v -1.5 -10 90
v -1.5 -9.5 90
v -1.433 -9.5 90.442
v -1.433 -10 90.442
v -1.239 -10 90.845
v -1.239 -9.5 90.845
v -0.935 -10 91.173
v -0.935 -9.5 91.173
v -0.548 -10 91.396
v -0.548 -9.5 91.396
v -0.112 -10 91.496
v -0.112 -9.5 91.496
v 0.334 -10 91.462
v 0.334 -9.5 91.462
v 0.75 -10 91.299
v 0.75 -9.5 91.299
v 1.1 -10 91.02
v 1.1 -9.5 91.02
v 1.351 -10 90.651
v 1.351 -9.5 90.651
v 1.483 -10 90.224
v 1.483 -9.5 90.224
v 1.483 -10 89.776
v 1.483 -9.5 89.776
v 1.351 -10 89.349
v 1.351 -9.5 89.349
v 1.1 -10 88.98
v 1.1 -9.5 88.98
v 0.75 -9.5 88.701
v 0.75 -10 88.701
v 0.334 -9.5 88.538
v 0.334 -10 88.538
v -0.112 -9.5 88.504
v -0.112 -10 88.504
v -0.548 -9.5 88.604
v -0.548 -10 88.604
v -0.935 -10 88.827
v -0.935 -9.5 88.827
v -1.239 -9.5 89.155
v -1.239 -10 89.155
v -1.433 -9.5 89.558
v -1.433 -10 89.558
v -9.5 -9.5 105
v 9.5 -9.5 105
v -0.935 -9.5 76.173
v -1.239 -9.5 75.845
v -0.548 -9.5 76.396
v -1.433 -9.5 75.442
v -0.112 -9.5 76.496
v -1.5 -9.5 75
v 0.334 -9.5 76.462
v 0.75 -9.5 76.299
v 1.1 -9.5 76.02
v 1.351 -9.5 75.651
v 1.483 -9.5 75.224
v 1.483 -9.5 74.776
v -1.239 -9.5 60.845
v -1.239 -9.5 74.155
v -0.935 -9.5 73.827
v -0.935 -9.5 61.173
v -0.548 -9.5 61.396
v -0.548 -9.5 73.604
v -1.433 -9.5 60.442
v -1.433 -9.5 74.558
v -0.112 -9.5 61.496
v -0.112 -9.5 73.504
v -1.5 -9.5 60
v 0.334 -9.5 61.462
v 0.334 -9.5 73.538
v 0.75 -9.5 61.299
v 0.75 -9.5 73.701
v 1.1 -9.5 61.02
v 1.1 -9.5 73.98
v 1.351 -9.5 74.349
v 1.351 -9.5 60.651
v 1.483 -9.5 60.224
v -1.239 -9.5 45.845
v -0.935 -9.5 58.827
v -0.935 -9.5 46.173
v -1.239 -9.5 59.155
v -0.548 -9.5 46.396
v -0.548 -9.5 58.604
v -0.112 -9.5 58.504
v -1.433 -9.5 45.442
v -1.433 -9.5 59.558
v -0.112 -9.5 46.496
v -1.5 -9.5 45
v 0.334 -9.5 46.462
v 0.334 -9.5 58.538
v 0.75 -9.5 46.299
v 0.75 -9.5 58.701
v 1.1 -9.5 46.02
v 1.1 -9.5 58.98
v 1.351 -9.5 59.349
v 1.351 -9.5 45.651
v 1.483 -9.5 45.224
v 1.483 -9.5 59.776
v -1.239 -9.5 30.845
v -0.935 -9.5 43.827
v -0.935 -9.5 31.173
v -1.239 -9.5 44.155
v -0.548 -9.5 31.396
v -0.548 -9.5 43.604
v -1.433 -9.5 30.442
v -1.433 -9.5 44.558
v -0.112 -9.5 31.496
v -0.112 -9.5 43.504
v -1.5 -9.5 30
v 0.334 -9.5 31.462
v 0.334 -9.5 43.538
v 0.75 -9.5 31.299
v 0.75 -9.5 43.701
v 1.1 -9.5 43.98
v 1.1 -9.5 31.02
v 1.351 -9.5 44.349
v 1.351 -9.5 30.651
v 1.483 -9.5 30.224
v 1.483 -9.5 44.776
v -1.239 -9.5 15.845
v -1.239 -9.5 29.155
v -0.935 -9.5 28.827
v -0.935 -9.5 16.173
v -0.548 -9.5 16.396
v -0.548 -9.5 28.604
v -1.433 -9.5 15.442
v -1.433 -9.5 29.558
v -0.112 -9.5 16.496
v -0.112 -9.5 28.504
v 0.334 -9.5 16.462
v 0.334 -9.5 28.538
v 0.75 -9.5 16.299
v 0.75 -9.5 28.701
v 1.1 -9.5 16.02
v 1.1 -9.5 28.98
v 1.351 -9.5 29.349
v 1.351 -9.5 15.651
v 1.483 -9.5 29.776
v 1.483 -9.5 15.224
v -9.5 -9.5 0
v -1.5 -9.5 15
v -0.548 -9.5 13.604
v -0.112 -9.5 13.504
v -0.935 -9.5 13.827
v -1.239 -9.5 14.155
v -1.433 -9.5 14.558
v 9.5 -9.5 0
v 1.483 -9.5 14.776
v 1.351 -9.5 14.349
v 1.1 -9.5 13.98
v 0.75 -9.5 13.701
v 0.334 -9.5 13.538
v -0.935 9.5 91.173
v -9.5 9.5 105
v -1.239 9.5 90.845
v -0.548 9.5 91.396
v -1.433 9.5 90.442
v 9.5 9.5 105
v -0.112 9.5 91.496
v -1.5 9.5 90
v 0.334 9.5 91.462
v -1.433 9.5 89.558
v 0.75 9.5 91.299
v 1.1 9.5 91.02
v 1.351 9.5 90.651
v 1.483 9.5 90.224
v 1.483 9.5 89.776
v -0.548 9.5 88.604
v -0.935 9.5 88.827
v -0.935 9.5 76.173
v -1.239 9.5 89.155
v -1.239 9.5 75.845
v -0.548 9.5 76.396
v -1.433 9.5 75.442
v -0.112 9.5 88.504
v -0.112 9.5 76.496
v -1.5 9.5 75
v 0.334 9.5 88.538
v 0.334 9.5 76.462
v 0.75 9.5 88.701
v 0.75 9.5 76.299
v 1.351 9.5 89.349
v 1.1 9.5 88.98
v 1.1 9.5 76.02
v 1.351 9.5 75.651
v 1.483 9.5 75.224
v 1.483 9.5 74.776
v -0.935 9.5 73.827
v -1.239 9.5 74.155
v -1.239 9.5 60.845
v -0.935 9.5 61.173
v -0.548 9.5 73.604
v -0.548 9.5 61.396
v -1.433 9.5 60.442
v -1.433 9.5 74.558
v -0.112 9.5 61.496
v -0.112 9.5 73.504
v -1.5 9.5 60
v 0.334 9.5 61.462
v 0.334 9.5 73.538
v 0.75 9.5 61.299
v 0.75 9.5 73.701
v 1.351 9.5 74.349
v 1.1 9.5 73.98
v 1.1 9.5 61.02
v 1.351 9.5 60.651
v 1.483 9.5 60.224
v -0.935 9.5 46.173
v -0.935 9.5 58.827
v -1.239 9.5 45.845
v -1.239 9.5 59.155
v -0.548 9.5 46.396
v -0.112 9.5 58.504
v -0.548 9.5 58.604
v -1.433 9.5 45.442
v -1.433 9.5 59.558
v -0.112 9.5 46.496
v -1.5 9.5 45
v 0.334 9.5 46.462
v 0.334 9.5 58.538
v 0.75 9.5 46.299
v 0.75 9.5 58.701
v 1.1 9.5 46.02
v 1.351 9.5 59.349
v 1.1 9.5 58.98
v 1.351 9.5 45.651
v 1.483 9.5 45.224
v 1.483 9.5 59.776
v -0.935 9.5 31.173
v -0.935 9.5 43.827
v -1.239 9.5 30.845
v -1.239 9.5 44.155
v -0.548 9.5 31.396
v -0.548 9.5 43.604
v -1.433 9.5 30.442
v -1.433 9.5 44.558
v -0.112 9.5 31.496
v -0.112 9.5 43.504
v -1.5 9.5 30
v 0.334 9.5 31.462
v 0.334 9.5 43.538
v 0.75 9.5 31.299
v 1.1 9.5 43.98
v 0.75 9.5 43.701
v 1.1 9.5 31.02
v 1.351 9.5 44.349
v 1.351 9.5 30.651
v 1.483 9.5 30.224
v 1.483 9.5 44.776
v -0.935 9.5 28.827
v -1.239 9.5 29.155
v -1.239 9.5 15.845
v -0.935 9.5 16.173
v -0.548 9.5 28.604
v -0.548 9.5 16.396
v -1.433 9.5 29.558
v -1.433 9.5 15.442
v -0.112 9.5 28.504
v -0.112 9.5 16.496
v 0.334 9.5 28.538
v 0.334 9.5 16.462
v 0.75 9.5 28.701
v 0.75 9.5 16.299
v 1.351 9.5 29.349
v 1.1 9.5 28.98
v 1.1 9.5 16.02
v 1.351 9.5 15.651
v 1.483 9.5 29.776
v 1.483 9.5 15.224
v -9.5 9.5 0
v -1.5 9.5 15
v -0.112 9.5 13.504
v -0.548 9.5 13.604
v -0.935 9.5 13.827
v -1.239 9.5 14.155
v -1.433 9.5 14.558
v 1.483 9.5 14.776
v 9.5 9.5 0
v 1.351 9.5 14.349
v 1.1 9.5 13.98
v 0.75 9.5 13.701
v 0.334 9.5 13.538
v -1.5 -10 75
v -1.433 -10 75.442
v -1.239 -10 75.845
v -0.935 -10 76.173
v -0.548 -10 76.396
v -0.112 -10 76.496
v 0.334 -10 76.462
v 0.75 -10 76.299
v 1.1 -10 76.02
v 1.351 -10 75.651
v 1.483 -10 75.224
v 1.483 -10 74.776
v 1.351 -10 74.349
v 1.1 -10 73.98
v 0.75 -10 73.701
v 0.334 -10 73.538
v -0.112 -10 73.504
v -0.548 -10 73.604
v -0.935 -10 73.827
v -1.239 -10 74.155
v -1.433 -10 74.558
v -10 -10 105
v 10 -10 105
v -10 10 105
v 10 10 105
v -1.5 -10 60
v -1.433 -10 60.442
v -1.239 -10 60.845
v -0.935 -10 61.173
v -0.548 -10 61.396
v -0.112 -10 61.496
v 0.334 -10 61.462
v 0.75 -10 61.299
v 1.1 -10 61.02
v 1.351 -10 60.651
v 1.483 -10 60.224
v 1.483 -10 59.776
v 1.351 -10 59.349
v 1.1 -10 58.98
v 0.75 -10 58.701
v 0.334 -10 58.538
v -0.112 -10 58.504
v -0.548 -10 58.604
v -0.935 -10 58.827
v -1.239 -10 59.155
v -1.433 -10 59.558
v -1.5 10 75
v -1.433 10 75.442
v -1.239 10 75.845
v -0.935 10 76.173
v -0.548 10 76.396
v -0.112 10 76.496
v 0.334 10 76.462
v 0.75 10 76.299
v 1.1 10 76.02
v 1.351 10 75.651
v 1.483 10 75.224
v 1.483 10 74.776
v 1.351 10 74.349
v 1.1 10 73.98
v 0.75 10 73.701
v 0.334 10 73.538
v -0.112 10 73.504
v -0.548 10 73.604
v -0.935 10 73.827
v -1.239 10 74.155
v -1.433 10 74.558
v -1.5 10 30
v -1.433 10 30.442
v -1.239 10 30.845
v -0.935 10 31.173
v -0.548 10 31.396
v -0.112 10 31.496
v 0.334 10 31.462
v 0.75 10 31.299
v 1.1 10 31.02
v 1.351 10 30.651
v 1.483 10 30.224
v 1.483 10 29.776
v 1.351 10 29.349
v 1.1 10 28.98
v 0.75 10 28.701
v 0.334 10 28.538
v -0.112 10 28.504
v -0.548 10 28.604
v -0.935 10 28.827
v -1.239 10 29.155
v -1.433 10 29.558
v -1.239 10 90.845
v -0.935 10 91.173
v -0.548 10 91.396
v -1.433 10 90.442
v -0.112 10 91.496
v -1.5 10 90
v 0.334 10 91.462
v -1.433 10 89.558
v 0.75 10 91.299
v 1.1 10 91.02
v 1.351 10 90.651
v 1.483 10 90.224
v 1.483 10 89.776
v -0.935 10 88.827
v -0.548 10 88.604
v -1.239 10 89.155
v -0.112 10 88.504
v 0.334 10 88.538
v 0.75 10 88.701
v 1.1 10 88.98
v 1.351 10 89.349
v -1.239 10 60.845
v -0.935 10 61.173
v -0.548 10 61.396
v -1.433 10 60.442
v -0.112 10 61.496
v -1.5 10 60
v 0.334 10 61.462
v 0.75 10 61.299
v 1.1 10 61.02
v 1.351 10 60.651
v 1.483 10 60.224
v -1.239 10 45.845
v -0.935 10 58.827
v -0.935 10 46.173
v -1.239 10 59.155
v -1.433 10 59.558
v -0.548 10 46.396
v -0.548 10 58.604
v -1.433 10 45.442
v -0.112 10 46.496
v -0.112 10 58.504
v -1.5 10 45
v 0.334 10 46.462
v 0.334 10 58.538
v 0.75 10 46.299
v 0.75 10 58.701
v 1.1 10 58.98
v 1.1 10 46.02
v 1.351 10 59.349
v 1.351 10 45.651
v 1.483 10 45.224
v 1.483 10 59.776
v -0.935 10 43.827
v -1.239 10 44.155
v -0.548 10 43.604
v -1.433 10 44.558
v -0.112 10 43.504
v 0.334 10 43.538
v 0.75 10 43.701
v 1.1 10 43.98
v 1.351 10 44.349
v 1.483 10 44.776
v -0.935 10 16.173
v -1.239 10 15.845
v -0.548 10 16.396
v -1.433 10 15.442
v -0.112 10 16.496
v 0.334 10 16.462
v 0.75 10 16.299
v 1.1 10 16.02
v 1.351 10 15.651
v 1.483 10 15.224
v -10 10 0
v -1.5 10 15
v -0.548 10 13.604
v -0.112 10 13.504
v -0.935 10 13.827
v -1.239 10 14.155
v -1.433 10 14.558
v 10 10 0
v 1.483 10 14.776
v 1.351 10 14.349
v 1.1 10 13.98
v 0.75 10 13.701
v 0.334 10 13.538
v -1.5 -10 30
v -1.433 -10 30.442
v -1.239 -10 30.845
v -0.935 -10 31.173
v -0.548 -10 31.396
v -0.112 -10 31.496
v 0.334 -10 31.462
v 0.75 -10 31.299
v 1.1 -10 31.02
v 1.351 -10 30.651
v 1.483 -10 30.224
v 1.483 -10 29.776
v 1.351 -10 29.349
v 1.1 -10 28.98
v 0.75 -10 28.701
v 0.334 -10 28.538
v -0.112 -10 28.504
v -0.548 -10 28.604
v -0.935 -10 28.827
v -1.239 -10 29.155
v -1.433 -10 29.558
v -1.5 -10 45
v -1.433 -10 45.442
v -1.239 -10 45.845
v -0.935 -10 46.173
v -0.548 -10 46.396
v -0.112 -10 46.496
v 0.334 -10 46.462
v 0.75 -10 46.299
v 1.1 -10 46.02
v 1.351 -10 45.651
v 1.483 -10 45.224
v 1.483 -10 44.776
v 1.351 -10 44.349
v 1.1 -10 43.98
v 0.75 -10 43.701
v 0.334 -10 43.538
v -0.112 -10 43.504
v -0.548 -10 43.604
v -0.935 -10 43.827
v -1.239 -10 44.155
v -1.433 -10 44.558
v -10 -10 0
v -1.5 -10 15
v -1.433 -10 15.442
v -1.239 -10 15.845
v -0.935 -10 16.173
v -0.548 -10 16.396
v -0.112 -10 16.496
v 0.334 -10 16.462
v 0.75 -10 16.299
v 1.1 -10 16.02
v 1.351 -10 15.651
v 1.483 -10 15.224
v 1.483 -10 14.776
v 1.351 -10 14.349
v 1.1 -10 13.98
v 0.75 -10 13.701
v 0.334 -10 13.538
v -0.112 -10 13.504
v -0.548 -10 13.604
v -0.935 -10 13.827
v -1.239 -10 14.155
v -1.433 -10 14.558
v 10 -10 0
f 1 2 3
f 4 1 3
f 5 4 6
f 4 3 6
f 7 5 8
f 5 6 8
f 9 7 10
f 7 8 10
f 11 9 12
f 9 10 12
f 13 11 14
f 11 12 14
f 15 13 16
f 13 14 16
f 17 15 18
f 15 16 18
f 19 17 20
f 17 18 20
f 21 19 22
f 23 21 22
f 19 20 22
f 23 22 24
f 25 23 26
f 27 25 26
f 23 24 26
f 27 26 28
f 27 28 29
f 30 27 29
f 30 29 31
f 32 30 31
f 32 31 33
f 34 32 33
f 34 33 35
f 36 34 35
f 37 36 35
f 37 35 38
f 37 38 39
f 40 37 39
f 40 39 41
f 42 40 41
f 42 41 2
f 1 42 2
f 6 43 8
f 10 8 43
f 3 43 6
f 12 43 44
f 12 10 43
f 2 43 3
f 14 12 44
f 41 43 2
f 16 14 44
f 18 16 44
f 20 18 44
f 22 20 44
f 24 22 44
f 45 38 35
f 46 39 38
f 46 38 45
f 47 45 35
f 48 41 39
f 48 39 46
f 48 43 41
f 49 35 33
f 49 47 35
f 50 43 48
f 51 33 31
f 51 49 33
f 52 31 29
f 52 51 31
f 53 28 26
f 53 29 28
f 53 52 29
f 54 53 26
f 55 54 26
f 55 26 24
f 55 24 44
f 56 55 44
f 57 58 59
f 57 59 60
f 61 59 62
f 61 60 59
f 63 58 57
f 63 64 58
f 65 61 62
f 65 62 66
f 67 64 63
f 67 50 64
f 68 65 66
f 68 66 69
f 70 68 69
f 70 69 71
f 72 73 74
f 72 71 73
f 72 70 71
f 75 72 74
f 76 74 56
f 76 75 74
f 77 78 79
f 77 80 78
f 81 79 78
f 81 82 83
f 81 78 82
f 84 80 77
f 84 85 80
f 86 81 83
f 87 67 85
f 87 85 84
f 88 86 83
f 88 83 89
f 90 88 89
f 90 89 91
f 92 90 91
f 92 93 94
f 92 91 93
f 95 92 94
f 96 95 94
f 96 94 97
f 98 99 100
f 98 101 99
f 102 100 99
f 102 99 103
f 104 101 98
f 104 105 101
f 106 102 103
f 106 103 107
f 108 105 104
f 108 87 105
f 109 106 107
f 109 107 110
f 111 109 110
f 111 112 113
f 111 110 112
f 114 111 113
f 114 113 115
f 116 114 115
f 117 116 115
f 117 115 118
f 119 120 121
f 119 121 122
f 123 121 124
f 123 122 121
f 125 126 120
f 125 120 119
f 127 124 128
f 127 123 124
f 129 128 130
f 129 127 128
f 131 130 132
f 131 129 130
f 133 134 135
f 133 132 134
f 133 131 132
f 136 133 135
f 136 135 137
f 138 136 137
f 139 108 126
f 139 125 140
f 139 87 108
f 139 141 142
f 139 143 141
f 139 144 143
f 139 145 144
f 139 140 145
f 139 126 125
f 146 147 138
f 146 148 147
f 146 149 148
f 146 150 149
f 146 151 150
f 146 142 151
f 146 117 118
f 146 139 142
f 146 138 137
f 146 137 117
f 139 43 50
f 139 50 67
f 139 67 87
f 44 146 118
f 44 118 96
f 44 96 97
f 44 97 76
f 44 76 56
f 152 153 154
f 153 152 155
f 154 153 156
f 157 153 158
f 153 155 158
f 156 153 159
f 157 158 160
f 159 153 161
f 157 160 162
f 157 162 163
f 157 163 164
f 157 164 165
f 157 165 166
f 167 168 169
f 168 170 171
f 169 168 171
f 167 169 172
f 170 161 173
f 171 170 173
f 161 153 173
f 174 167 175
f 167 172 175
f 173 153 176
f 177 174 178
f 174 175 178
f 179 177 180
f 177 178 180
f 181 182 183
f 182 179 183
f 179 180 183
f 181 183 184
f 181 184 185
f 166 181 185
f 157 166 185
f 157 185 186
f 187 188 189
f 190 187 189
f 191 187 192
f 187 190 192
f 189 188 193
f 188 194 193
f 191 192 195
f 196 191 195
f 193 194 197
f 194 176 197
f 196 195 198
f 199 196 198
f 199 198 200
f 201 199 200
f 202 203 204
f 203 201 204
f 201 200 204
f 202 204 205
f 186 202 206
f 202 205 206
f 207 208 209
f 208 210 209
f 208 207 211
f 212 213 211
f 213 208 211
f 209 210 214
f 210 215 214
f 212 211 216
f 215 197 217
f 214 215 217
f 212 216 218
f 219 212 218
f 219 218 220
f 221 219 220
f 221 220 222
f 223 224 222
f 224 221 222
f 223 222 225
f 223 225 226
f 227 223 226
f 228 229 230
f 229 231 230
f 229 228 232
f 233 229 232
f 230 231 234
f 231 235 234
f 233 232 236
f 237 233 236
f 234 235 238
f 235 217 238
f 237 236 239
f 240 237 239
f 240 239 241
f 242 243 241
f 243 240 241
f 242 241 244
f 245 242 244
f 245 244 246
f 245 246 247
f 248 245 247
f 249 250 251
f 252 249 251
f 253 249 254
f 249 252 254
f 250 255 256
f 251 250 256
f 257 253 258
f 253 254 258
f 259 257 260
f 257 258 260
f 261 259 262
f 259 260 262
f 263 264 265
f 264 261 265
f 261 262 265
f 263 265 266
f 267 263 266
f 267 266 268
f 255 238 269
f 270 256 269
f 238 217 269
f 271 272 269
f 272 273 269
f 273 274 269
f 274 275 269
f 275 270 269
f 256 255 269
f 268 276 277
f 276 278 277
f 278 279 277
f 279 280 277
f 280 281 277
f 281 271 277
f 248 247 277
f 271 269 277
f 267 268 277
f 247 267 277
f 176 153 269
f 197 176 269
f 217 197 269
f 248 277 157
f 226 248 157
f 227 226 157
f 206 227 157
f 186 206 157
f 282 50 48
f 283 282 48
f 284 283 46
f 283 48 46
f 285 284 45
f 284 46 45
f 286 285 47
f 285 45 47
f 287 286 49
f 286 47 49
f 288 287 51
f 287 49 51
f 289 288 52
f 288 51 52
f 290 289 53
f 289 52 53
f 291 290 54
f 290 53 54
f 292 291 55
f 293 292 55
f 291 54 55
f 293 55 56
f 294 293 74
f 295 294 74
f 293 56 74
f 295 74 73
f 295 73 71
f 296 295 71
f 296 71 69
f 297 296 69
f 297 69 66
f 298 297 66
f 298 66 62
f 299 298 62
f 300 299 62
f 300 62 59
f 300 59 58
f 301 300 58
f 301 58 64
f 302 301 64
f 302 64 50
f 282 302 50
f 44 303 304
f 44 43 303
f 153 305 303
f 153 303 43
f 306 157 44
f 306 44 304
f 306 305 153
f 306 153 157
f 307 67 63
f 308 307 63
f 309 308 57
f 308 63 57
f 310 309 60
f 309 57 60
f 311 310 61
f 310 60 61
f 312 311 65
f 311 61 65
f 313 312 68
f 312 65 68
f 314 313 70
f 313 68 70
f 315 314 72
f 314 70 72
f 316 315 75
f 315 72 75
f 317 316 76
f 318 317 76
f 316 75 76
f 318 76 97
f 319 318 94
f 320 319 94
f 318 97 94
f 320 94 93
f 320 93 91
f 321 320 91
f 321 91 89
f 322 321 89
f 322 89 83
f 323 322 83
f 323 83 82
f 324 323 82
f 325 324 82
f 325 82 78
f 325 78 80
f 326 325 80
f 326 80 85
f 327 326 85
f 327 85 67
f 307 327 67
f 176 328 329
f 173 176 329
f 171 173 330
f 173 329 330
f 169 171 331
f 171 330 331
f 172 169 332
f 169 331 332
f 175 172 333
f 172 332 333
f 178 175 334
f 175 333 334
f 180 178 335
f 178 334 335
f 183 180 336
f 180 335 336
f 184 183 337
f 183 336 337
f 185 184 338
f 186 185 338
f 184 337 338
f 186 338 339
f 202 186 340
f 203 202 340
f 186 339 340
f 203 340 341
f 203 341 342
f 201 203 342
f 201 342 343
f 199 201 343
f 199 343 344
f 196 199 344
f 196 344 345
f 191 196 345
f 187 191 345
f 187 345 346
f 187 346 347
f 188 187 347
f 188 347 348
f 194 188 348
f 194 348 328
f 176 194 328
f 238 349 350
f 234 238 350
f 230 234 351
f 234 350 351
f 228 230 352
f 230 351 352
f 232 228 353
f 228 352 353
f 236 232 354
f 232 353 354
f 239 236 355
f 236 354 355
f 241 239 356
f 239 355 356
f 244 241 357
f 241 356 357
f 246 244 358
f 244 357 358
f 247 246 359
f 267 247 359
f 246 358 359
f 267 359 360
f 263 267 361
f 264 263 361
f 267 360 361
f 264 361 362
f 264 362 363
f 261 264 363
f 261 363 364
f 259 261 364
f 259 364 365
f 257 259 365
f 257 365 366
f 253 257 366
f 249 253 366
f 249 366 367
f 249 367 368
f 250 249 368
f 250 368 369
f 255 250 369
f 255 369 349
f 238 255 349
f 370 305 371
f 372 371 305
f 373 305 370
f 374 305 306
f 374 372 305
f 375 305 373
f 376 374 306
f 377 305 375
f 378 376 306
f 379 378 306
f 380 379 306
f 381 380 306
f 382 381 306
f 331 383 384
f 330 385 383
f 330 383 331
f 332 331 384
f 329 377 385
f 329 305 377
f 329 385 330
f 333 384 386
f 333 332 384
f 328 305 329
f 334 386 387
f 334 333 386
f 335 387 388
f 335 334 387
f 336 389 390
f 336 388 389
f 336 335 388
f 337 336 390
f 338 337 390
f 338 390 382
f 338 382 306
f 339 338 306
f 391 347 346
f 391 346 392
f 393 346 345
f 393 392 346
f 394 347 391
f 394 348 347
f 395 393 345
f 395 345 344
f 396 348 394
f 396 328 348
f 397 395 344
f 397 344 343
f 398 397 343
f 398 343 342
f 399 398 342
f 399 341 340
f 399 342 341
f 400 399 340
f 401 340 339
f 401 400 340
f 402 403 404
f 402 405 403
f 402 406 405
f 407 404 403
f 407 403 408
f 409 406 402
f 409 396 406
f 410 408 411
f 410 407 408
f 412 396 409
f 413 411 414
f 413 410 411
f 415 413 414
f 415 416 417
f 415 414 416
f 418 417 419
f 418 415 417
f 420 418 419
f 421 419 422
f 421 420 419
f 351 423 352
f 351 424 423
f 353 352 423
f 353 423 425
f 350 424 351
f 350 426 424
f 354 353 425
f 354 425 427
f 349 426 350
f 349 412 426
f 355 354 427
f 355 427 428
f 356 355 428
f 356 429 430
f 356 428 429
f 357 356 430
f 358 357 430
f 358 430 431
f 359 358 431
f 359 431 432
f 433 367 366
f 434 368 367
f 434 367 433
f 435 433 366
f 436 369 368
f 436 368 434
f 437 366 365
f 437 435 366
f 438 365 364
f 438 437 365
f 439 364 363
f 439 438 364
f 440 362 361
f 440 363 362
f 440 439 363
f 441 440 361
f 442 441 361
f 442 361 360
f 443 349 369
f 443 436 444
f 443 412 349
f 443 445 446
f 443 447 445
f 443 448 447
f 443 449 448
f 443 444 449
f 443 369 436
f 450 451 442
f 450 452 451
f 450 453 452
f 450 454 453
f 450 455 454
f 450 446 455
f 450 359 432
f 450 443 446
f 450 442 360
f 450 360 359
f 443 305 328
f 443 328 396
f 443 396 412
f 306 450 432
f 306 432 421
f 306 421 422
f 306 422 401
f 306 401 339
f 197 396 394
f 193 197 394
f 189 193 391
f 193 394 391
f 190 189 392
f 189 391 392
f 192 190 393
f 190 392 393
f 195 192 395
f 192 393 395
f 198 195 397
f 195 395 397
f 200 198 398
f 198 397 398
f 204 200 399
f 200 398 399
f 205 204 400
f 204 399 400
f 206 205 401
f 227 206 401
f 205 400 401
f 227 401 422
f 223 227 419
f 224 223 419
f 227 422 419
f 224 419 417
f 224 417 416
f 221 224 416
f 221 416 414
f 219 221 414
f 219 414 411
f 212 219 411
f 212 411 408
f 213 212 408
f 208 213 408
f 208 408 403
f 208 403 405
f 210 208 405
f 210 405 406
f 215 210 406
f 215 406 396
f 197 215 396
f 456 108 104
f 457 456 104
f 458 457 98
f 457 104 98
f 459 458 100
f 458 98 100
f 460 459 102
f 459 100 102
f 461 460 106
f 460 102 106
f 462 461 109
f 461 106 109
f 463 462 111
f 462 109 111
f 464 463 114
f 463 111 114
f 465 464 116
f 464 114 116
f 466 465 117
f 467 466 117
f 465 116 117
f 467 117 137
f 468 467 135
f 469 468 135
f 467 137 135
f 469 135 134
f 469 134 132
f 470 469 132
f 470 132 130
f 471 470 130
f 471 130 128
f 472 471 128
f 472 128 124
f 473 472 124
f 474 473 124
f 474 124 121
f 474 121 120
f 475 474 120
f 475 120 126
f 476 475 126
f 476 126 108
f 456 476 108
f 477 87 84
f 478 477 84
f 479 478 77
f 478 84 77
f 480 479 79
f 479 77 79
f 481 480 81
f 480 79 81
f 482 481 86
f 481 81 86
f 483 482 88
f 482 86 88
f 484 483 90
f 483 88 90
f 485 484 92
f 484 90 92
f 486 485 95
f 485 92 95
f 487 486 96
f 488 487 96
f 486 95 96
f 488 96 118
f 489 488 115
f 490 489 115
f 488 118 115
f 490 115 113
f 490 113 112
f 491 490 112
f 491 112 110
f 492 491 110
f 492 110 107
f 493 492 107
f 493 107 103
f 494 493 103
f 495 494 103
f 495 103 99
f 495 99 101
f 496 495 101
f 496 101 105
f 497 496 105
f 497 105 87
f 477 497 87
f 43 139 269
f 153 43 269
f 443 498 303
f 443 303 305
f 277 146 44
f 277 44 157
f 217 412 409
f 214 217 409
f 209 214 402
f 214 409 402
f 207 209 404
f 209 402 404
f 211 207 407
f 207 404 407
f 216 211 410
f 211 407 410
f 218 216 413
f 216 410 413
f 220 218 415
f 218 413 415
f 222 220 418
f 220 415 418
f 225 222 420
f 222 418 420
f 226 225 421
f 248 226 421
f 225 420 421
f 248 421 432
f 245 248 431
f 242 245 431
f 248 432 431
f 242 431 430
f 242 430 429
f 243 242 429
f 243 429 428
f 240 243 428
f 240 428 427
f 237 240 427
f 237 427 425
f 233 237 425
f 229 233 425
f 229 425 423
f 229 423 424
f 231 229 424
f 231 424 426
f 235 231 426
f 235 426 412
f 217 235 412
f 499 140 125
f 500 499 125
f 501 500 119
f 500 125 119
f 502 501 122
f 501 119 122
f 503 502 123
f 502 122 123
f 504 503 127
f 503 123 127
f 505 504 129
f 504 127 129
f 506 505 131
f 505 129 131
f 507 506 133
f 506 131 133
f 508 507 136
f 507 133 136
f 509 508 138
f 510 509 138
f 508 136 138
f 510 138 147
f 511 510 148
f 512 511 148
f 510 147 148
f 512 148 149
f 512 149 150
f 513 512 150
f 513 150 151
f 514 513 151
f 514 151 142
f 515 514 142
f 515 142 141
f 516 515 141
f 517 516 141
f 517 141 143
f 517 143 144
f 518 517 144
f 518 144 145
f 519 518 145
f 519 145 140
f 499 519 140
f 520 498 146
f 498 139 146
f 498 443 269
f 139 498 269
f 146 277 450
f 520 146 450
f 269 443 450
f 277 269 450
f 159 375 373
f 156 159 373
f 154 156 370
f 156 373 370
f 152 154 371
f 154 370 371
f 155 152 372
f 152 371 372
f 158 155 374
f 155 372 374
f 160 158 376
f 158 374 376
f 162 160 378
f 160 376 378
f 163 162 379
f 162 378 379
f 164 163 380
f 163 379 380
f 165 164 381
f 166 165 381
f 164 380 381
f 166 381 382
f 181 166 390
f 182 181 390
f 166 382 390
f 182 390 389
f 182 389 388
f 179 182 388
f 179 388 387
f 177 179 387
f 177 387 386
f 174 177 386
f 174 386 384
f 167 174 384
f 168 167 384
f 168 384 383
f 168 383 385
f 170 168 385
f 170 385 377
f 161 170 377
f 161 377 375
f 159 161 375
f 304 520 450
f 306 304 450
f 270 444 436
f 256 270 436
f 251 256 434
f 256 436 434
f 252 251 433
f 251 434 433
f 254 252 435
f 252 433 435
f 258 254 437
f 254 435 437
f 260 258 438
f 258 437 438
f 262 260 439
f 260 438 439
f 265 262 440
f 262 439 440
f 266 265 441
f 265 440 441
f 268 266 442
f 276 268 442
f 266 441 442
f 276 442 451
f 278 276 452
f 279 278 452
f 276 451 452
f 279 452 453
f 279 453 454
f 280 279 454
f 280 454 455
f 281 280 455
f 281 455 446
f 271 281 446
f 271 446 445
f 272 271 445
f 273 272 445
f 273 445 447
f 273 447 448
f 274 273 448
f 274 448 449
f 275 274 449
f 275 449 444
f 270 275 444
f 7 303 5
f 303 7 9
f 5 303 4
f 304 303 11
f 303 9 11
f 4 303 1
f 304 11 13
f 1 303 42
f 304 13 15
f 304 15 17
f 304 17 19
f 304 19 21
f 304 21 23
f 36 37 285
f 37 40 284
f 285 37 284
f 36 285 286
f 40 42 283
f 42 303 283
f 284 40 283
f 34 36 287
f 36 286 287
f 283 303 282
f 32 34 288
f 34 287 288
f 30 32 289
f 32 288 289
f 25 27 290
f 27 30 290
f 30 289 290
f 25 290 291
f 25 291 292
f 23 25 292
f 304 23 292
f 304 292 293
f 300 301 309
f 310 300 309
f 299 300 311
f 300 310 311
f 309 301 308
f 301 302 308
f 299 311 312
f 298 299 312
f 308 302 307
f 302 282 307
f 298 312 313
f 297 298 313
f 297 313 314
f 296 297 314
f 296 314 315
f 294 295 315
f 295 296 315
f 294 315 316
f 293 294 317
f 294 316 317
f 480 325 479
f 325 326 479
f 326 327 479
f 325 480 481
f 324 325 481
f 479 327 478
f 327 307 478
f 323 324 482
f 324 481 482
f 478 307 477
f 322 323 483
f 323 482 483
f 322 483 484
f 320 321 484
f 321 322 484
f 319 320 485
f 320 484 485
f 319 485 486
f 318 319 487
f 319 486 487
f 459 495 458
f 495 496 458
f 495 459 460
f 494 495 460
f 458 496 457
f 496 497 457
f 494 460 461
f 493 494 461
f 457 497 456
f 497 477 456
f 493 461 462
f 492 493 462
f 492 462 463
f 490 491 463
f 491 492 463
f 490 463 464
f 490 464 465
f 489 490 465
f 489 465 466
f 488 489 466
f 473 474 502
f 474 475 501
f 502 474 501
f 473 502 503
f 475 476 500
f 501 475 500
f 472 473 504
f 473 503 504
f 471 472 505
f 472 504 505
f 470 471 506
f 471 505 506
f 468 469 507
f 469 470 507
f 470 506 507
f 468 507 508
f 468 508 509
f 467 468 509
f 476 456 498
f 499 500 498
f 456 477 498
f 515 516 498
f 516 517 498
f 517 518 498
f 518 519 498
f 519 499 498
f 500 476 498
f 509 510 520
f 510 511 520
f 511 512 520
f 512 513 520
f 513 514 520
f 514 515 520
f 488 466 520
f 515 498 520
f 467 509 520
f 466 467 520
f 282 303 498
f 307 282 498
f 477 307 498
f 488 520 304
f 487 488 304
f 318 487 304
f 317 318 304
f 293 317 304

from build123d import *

# Parameters (mm, degrees)
F0_W     = 20
F0_H     = 20
F0_W_2   = 19
F0_H_2   = 19
F1_DEPTH = 105
F2_R     = 1.5
F3_DEPTH = 25


with BuildPart() as f1:
    # F0 (on Top) → F1 (new body)
    with BuildSketch(Plane.XY):
        Rectangle(F0_W, F0_H)
        Rectangle(F0_W_2, F0_H_2, mode=Mode.SUBTRACT)
    extrude(amount=F1_DEPTH)

    # F2 (on face) → F3 (cut)
    with BuildSketch(Plane(origin=(0, 10, 0), x_dir=(-1, 0, 0), z_dir=(0, 1, 0))):
        with Locations((0, 90)):
            Circle(F2_R)
        with Locations((0, 75)):
            Circle(F2_R)
        with Locations((0, 60)):
            Circle(F2_R)
        with Locations((0, 45)):
            Circle(F2_R)
        with Locations((0, 30)):
            Circle(F2_R)
        with Locations((0, 15)):
            Circle(F2_R)
    extrude(amount=-F3_DEPTH, mode=Mode.SUBTRACT)


solid = f1.part
